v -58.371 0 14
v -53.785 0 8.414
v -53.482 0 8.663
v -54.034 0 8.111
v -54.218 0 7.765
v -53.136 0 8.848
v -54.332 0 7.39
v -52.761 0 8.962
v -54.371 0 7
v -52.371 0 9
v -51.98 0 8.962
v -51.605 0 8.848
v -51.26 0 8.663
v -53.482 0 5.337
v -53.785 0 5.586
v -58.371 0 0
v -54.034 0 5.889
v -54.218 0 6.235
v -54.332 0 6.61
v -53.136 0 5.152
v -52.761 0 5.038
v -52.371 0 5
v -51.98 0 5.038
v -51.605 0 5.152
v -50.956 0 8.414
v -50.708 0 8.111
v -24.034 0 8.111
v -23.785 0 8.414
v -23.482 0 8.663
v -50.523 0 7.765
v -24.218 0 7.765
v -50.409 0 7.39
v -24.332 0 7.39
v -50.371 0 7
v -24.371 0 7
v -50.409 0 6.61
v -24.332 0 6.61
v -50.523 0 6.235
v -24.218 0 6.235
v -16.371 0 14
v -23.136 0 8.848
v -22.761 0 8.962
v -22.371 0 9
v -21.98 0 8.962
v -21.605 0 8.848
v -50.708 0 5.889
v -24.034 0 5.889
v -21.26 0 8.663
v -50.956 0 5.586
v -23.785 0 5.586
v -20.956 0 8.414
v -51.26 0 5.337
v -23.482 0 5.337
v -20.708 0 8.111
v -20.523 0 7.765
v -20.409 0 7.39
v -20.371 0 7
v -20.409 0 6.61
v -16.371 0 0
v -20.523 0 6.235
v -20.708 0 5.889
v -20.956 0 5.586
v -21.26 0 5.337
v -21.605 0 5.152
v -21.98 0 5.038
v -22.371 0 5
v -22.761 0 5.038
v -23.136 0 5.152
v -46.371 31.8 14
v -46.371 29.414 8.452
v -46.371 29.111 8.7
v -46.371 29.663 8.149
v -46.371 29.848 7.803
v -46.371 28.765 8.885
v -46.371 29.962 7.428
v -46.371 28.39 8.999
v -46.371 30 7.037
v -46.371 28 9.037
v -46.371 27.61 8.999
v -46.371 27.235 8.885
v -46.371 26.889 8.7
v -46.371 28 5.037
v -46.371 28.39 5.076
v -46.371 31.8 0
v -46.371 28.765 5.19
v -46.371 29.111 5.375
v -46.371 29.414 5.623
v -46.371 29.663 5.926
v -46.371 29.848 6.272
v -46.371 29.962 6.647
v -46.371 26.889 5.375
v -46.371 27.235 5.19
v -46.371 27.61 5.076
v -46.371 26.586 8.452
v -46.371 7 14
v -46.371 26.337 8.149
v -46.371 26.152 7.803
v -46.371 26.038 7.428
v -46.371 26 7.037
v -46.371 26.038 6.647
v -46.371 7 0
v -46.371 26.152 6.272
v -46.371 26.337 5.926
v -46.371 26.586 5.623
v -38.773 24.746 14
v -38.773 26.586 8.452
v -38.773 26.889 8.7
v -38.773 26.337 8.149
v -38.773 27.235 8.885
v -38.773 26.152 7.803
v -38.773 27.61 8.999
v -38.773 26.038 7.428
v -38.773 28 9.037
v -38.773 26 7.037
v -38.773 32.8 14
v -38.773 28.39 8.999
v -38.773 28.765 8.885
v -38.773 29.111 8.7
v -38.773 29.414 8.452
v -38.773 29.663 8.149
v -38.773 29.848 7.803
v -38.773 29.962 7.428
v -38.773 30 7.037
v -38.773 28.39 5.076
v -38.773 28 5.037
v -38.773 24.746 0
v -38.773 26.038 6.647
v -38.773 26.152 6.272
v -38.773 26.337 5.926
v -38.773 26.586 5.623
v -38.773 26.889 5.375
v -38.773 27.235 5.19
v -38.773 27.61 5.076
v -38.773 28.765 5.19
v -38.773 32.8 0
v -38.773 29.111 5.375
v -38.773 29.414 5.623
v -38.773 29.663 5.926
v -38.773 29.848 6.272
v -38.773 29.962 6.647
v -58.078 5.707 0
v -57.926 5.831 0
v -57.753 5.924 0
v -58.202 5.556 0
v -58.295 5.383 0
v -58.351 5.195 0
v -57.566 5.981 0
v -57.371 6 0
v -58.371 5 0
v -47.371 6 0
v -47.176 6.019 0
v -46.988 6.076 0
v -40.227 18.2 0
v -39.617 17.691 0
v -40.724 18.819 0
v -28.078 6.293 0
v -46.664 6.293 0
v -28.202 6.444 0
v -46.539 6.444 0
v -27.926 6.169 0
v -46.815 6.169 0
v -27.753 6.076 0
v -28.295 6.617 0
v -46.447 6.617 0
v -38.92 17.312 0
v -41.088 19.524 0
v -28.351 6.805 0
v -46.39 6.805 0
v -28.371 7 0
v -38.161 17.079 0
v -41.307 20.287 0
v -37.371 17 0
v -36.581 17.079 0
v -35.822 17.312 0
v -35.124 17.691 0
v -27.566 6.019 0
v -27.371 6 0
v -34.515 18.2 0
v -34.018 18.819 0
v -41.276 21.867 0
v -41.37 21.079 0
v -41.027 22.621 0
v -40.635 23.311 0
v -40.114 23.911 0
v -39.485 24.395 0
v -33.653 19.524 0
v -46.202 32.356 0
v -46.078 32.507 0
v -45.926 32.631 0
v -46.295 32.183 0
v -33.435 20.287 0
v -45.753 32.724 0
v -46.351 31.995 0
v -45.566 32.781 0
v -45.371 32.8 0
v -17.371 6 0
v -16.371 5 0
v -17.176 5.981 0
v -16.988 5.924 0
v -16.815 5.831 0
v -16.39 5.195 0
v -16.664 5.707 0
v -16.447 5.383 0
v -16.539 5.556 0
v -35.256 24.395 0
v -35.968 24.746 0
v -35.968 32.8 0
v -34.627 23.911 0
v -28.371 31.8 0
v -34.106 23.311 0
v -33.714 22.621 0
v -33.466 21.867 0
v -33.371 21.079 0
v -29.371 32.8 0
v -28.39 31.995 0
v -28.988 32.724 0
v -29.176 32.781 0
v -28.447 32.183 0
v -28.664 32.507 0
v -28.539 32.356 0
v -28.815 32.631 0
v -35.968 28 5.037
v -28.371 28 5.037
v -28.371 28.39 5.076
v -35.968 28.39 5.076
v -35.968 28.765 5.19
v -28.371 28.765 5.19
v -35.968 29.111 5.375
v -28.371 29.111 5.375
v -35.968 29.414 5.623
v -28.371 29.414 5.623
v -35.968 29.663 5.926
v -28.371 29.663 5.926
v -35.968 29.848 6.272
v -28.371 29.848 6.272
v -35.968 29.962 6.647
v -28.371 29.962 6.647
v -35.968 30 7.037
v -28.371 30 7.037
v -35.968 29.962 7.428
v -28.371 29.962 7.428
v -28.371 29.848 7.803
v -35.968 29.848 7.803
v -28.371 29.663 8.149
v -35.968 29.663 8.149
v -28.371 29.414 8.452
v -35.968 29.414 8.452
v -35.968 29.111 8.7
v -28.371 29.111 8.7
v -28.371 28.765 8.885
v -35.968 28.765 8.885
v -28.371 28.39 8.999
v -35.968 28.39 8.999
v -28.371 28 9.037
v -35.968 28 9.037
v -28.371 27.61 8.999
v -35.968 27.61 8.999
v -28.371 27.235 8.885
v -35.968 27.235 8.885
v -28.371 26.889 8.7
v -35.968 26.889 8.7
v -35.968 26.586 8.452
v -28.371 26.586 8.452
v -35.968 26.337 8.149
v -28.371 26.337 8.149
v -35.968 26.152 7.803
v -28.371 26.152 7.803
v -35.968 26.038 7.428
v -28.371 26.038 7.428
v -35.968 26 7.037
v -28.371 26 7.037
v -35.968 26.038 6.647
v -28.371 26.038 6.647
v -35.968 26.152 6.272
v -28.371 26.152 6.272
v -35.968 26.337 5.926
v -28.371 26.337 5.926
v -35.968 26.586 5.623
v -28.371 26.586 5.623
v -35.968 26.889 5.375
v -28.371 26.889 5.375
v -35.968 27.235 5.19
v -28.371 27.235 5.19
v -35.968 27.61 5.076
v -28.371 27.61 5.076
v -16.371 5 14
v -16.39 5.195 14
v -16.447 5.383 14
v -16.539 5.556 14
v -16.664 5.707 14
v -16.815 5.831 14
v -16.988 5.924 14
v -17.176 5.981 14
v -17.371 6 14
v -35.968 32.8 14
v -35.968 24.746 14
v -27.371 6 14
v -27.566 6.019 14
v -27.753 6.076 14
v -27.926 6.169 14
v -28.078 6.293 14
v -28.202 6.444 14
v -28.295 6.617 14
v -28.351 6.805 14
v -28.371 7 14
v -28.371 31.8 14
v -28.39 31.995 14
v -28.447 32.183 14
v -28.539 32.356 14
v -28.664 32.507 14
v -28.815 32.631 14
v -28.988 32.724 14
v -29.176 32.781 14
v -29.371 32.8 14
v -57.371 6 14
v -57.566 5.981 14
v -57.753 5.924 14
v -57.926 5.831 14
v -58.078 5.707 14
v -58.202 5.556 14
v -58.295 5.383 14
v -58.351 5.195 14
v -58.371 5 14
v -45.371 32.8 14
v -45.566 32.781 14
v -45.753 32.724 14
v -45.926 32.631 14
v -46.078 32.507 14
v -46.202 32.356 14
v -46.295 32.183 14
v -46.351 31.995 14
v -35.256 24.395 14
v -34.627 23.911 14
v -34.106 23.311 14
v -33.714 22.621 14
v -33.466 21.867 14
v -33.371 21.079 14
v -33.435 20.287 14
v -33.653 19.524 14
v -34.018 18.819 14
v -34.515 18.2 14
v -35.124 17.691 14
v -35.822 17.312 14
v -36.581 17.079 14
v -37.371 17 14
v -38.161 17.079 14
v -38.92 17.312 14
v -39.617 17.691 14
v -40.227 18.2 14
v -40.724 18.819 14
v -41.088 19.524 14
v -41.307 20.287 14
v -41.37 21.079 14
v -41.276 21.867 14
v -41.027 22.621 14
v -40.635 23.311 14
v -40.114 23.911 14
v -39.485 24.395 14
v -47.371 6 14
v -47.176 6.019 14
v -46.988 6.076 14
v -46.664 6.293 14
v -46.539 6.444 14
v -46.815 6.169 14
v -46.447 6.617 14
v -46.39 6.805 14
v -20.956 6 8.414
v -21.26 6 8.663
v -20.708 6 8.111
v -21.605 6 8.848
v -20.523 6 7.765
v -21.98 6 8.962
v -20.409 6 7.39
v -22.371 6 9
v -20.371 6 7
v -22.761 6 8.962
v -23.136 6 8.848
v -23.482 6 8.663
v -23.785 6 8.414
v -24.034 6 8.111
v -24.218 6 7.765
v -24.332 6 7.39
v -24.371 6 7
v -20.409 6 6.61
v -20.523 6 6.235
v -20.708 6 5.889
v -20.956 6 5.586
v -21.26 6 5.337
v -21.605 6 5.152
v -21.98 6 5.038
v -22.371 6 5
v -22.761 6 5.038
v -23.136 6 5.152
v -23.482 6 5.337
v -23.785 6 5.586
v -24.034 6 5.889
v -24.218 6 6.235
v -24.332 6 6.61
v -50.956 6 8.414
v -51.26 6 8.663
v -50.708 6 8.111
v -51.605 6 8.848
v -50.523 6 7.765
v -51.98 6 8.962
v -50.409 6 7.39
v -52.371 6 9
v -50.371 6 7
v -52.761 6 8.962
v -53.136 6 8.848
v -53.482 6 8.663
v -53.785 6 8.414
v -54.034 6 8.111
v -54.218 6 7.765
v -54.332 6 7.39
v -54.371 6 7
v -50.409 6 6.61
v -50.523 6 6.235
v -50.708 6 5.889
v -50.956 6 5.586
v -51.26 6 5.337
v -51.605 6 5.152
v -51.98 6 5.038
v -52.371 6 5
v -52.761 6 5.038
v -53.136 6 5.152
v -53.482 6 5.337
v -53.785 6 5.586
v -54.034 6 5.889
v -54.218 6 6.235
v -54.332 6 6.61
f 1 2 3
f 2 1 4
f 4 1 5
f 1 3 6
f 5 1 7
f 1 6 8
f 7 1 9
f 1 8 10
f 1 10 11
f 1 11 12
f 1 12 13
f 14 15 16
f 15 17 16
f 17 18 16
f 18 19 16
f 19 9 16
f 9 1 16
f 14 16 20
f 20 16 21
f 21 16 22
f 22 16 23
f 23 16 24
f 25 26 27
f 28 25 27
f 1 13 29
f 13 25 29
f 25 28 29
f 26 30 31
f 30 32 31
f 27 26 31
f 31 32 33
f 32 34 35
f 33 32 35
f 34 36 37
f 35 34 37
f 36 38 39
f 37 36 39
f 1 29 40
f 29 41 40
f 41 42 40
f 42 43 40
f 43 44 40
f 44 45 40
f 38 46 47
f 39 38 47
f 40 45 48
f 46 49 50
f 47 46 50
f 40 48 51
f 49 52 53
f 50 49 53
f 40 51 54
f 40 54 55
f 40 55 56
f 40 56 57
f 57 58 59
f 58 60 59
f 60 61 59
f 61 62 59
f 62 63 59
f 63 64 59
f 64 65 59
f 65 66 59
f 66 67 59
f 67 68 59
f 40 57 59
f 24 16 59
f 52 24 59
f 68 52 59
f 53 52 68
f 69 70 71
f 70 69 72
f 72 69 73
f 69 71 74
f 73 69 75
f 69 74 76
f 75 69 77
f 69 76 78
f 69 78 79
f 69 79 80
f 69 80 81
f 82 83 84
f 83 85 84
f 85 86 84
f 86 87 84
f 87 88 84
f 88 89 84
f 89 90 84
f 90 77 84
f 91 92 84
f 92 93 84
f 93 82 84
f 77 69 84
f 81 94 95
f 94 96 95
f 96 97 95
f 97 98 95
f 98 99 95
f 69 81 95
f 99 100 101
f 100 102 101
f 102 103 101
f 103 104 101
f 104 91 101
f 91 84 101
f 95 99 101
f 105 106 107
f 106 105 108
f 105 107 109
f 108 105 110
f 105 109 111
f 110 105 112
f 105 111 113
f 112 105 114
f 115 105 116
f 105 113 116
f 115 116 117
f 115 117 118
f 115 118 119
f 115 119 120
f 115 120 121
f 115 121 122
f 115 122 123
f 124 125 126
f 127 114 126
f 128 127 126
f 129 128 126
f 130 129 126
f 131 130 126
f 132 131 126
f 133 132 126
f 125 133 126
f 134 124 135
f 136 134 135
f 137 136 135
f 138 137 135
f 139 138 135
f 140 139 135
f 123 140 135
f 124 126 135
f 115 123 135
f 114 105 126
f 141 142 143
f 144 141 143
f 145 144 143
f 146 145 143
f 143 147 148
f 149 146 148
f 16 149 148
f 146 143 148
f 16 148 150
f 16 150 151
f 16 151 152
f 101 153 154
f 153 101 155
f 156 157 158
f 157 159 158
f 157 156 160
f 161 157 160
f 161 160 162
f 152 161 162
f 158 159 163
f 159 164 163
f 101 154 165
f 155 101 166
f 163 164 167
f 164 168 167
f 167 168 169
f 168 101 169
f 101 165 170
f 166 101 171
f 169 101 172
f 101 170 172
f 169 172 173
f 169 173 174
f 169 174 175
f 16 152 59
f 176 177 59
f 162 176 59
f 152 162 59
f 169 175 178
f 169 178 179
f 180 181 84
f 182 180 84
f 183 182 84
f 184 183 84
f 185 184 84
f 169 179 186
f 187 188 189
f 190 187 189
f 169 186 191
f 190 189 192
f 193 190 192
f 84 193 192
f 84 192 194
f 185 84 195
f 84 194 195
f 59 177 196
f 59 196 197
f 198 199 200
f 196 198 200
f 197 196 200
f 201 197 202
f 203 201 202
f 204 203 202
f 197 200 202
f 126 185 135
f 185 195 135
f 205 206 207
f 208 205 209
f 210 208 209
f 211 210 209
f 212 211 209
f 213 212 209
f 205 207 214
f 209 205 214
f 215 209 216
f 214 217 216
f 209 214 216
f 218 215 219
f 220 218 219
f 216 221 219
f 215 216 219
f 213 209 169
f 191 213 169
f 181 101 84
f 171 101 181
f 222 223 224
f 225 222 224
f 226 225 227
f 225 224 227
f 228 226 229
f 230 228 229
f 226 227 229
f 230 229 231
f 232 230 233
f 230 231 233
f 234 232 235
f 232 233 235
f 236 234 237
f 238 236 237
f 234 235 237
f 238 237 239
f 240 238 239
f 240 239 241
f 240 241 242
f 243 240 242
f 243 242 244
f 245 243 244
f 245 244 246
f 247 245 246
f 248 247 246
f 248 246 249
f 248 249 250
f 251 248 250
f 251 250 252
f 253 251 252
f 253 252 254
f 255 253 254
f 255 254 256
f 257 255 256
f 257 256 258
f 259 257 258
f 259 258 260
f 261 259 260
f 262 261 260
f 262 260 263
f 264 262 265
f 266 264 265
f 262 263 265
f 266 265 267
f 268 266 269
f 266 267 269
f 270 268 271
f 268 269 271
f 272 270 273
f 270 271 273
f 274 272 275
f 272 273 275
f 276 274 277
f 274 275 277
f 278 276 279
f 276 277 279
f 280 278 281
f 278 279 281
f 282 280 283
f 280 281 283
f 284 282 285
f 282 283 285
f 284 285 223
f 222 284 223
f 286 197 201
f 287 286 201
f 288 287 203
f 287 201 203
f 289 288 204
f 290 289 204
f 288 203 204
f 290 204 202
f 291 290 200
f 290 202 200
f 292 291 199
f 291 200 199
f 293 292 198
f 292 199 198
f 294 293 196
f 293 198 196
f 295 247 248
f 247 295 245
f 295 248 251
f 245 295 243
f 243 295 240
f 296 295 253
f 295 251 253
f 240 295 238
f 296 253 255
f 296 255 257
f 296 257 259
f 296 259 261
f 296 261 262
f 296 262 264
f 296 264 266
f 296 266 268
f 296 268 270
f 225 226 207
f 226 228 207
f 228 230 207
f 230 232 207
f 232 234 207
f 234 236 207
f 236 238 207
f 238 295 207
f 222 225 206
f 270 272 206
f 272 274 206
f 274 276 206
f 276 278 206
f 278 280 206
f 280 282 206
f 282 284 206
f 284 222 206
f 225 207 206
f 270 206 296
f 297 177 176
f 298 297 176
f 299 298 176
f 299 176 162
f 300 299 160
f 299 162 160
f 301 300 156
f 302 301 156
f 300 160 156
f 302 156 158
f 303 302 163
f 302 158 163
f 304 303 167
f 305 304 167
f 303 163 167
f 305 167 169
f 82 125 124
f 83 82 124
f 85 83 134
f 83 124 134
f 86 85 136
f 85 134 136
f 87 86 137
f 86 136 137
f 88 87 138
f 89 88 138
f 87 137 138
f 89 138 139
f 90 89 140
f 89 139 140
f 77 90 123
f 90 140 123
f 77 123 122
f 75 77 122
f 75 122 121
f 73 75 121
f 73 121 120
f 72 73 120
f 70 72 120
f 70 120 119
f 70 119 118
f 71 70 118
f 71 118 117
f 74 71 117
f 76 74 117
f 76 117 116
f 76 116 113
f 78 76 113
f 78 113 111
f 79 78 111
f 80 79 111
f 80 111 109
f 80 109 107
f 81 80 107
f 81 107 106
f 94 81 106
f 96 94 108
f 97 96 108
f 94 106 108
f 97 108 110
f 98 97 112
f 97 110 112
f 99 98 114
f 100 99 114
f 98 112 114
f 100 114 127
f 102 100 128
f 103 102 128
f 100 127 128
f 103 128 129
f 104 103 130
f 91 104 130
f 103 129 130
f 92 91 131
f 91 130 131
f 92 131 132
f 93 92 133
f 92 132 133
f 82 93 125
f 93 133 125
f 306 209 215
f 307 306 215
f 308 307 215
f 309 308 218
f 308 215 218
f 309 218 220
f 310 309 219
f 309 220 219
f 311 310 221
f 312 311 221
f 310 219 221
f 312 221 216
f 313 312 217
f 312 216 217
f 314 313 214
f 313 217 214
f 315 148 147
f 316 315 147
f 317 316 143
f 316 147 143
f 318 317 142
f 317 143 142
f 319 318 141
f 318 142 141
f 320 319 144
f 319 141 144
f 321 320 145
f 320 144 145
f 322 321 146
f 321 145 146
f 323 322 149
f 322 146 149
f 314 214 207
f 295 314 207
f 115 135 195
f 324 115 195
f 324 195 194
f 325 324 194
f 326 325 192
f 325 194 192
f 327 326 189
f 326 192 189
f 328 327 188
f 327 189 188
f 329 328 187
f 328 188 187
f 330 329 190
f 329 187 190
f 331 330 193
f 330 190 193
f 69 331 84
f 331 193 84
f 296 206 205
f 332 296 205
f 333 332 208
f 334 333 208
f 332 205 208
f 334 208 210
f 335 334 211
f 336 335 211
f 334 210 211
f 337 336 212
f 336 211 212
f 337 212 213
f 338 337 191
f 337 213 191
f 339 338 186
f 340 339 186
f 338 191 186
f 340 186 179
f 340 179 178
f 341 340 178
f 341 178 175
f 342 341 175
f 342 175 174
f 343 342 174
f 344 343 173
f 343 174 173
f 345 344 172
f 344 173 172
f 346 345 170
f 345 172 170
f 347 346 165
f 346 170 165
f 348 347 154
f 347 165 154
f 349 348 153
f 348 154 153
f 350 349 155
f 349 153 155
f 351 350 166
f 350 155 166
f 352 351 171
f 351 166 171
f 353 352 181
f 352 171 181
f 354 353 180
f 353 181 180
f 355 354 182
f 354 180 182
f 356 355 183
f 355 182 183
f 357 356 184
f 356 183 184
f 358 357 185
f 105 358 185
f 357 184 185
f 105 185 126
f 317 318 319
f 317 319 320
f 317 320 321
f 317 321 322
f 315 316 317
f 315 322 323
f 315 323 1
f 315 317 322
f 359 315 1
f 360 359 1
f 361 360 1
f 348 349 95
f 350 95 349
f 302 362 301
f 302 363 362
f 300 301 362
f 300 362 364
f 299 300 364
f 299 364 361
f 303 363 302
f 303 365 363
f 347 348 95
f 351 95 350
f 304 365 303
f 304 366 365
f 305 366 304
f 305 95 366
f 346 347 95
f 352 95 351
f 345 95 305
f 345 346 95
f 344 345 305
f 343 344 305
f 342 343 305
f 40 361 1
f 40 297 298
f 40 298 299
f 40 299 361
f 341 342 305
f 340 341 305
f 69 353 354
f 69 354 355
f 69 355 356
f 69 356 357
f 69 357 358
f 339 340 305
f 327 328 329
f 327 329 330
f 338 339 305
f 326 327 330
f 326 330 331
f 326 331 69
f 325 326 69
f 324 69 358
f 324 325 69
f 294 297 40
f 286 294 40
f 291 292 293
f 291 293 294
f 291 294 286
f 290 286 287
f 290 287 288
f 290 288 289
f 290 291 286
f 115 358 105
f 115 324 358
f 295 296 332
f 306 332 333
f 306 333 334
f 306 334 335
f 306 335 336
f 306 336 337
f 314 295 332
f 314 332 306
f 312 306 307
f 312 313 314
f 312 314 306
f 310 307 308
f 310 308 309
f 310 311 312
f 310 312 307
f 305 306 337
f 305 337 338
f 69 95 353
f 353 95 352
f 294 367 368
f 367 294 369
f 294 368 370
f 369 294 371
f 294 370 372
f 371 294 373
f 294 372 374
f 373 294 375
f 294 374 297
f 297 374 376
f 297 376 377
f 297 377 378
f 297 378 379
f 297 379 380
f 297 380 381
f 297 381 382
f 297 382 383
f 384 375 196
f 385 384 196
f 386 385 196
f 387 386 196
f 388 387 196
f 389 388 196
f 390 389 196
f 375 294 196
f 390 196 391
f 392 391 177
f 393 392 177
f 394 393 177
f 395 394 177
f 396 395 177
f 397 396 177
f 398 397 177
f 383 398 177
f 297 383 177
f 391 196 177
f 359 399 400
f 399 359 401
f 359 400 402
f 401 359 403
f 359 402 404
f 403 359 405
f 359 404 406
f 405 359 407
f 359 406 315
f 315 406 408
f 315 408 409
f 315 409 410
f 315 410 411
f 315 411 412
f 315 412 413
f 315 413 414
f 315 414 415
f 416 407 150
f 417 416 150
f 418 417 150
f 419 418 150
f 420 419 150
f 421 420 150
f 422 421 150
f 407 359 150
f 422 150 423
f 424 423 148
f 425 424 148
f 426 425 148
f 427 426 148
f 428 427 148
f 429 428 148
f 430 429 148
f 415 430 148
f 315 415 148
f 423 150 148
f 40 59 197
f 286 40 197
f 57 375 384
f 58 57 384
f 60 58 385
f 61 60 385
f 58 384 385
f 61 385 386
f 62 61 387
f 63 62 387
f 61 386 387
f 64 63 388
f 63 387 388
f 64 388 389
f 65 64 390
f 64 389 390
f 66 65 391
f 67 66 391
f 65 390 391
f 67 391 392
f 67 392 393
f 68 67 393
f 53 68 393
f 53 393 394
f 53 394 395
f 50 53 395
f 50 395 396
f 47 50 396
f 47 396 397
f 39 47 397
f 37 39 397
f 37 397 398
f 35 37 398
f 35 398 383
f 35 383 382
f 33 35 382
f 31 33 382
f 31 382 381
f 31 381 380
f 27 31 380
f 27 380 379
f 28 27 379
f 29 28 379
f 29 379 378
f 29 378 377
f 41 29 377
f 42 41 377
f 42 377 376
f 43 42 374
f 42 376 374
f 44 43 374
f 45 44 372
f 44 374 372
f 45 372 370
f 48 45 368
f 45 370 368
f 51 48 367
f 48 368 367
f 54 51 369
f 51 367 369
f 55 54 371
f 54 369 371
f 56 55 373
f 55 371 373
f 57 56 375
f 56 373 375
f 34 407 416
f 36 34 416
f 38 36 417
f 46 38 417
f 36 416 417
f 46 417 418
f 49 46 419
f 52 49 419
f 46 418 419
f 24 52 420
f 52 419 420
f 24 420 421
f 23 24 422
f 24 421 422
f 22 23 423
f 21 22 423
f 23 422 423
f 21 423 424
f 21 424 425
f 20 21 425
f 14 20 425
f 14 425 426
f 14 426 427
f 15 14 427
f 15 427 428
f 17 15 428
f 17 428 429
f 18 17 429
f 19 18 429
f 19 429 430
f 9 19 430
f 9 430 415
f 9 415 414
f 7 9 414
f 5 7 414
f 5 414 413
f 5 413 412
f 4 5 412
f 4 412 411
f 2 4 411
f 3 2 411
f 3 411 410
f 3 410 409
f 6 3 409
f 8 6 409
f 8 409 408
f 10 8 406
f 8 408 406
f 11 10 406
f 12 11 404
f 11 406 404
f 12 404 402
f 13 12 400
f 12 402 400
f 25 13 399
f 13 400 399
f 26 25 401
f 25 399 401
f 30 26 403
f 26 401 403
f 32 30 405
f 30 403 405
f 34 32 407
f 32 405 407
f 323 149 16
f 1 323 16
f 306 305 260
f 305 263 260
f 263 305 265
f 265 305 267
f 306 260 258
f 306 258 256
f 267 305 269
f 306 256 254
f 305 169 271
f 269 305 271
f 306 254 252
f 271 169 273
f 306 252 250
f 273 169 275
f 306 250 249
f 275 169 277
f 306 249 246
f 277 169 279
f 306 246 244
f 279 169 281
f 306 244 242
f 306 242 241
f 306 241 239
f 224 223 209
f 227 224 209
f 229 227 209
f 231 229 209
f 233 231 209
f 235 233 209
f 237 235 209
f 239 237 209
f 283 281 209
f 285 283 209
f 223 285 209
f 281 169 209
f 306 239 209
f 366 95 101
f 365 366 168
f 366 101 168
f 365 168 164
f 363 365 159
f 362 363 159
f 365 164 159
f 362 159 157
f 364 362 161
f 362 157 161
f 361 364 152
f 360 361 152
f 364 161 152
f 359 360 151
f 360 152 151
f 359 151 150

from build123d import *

# Parameters (mm, degrees)
Y_KSEKLIK_EKSTR_ZYON1_DEPTH = 14
IZIM2_R                     = 2
KES_EKSTR_ZYON1_DEPTH       = 14
IZIM3_R                     = 2
KES_EKSTR_ZYON2_DEPTH       = 50


with BuildPart() as part:
    # Çizim1 → Yükseklik-Ekstrüzyon1 (new body)
    with BuildSketch(Plane.XY):
        with BuildLine():
            Line((-58.370675481, 0), (-16.370675481, 0))
            Line((-16.370675481, 0), (-16.370675481, 5))
            ThreePointArc((-16.370675481, 5), (-16.663568699, 5.707106781), (-17.370675481, 6))
            Line((-17.370675481, 6), (-27.370675481, 6))
            ThreePointArc((-27.370675481, 6), (-28.077782262, 6.292893219), (-28.370675481, 7))
            Line((-28.370675481, 7), (-28.370675481, 31.8))
            ThreePointArc((-28.370675481, 31.8), (-28.663568699, 32.507106781), (-29.370675481, 32.8))
            Line((-29.370675481, 32.8), (-35.968113831, 32.8))
            Line((-35.968113831, 32.8), (-35.968113831, 24.746040686))
            ThreePointArc((-35.968113831, 24.746040686), (-37.370675481, 17), (-38.77323713, 24.746040686))
            Line((-38.77323713, 24.746040686), (-38.77323713, 32.8))
            Line((-38.77323713, 32.8), (-45.370675481, 32.8))
            ThreePointArc((-45.370675481, 32.8), (-46.077782262, 32.507106781), (-46.370675481, 31.8))
            Line((-46.370675481, 31.8), (-46.370675481, 7))
            ThreePointArc((-46.370675481, 7), (-46.663568699, 6.292893219), (-47.370675481, 6))
            Line((-47.370675481, 6), (-57.370675481, 6))
            ThreePointArc((-57.370675481, 6), (-58.077782262, 5.707106781), (-58.370675481, 5))
            Line((-58.370675481, 5), (-58.370675481, 0))
        make_face()
    extrude(amount=Y_KSEKLIK_EKSTR_ZYON1_DEPTH)

    # Çizim2 → Kes-Ekstrüzyon1 (cut)
    with BuildSketch(Plane(origin=(0, 6, 0), x_dir=(1, 0, 0), z_dir=(0, 1, 0))):
        with Locations((-22.370675481, -7)):
            Circle(IZIM2_R)
        with Locations((-52.370675481, -7)):
            Circle(IZIM2_R)
    extrude(amount=-KES_EKSTR_ZYON1_DEPTH, mode=Mode.SUBTRACT)

    # Çizim3 → Kes-Ekstrüzyon2 (cut)
    with BuildSketch(Plane(origin=(-28.370675481, 0, 0), x_dir=(0, 0, -1), z_dir=(1, 0, 0))):
        with Locations((-7.037491544, 28)):
            Circle(IZIM3_R)
    extrude(amount=-KES_EKSTR_ZYON2_DEPTH, mode=Mode.SUBTRACT)


solid = part.part
